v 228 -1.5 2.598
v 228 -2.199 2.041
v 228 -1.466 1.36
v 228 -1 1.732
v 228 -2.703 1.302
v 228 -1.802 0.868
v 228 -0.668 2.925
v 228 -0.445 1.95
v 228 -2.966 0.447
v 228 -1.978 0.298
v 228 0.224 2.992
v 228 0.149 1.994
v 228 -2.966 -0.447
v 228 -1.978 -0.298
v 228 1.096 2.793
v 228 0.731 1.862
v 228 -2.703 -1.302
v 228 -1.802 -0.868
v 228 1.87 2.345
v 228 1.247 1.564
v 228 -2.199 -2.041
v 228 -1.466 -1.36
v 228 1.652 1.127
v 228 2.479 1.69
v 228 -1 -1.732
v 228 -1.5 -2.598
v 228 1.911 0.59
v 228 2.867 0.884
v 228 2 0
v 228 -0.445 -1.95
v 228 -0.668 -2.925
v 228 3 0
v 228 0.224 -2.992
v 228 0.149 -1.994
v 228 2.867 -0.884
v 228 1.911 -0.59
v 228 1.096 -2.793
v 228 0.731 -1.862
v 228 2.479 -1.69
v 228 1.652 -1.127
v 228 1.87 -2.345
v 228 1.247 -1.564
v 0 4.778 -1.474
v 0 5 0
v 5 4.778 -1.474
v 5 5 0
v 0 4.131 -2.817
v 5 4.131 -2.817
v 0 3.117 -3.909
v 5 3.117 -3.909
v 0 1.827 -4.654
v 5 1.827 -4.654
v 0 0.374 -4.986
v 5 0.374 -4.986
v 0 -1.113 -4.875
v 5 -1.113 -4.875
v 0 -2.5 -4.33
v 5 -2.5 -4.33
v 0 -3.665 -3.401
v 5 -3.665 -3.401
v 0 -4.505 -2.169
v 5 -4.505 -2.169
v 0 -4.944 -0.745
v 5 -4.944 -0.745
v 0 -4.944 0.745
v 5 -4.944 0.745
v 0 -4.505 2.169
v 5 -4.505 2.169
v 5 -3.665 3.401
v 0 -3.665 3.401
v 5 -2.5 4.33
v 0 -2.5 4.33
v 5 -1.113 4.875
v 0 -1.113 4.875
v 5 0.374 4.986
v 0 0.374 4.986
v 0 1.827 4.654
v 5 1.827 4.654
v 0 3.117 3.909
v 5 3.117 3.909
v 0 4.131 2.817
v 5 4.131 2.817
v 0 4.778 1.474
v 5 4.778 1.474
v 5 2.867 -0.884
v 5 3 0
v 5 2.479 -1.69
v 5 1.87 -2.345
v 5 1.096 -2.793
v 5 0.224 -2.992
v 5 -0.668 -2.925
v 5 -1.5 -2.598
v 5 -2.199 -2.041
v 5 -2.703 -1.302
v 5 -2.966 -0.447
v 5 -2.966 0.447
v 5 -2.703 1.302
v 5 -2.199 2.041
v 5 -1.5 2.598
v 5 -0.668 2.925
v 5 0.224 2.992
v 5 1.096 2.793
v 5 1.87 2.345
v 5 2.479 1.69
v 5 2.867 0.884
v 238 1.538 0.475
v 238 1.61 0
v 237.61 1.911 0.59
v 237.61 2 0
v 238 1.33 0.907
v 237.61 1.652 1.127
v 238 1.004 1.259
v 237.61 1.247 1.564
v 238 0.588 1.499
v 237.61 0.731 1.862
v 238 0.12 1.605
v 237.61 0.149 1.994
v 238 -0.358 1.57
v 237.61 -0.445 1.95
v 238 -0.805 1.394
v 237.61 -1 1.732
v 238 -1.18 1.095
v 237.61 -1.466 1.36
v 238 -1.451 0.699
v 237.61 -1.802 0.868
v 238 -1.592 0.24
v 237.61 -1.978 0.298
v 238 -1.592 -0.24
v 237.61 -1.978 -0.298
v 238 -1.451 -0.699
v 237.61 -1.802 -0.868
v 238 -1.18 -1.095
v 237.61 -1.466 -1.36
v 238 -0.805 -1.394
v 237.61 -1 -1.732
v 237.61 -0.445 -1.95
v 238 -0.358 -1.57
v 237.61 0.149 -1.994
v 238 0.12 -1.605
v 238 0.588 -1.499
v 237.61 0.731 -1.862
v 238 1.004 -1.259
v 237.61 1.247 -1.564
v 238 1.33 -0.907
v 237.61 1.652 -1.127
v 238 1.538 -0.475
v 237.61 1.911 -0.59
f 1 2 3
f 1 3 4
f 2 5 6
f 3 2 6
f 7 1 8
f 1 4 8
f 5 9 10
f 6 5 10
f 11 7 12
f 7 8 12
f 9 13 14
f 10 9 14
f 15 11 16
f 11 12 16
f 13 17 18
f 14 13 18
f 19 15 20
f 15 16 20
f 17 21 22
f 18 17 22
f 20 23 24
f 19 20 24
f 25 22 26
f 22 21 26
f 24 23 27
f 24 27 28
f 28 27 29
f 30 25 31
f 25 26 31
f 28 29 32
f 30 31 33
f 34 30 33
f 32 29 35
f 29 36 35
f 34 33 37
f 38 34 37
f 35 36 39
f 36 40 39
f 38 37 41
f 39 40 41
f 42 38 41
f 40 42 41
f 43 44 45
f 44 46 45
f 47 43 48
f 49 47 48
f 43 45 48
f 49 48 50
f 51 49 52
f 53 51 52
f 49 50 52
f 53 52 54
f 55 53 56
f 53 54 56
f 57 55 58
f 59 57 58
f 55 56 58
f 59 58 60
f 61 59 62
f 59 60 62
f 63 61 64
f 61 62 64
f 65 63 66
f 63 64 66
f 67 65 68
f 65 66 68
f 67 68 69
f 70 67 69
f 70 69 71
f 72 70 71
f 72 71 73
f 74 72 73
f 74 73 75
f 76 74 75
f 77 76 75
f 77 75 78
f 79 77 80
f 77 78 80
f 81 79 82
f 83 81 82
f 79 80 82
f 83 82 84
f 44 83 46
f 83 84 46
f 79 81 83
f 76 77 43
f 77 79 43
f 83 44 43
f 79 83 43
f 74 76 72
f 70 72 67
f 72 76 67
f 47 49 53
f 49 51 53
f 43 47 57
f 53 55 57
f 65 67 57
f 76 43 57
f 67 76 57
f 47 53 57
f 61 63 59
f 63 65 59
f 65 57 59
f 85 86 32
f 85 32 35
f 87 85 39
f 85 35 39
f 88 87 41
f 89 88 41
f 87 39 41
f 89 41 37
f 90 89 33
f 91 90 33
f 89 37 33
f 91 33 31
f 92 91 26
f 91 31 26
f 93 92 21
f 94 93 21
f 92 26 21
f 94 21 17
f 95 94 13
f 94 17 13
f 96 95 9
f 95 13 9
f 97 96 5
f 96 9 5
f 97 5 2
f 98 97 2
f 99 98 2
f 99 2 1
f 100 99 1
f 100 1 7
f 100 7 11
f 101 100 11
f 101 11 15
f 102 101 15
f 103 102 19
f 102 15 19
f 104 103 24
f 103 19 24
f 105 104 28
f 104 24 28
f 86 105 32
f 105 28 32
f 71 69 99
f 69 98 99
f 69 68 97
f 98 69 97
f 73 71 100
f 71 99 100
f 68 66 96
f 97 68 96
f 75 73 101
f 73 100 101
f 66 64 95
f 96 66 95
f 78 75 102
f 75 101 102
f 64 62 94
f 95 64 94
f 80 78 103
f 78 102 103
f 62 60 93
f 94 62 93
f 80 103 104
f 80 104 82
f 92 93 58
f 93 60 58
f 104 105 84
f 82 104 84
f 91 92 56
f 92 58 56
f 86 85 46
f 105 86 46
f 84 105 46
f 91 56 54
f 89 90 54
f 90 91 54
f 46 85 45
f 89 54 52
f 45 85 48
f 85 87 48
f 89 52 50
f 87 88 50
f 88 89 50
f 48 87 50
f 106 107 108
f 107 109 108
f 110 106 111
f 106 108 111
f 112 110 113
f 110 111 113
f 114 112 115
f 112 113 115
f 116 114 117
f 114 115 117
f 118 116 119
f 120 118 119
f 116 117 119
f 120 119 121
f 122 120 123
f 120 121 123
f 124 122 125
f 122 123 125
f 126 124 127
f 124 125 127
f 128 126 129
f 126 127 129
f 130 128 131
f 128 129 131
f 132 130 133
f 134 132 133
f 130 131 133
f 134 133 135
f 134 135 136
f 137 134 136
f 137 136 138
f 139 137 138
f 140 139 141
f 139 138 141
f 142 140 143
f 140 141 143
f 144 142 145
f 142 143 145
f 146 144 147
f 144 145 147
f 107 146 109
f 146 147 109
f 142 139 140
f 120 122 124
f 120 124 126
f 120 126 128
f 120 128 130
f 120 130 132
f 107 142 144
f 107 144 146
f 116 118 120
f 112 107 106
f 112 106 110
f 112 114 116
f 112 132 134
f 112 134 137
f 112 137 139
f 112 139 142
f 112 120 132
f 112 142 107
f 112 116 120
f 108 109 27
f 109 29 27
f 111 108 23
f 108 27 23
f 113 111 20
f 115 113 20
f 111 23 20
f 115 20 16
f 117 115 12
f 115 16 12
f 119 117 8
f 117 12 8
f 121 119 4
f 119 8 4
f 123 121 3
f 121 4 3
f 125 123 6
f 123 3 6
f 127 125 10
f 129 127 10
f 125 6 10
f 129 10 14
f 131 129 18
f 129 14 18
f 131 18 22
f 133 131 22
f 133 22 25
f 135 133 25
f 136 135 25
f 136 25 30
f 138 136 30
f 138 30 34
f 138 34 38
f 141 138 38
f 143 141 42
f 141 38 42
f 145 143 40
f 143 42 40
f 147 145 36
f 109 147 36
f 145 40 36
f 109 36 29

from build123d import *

# Parameters (mm, degrees)
SKETCH2_R           = 2.75
BOSS_EXTRUDE1_DEPTH = 10


# Read off the part's stored shape, not the designer's step: M4 Machine Threads Stud1
with BuildPart() as part:
    # Sketch1 → Revolve1 (revolve)
    with BuildSketch(Plane.XY):
        Polygon((0, 0), (0, 5), (5, 5), (5, 3), (228, 3), (228, 0), align=None)
    revolve(axis=Axis((228, 0, 0), (-1, 0, 0)))

    # Sketch2 → Boss-Extrude1 (add)
    with BuildSketch(Plane(origin=(228, 0, 0), x_dir=(0, 0, -1), z_dir=(1, 0, 0))):
        with Locations(Location((0, 0, 0), (0, 0, 90))):
            Circle(SKETCH2_R)
    extrude(amount=BOSS_EXTRUDE1_DEPTH)

    # M4 Machine Threads Stud1 outline → M4 Machine Threads Stud1 (revolve, cut)
    with BuildSketch(Plane.YX):
        Polygon((2, 237.61), (2, 228), (2.75, 228), (2.75, 238), (1.61, 238), align=None)
    revolve(axis=Axis((0, 0, 0), (1, 0, 0)), mode=Mode.SUBTRACT)


solid = part.part
